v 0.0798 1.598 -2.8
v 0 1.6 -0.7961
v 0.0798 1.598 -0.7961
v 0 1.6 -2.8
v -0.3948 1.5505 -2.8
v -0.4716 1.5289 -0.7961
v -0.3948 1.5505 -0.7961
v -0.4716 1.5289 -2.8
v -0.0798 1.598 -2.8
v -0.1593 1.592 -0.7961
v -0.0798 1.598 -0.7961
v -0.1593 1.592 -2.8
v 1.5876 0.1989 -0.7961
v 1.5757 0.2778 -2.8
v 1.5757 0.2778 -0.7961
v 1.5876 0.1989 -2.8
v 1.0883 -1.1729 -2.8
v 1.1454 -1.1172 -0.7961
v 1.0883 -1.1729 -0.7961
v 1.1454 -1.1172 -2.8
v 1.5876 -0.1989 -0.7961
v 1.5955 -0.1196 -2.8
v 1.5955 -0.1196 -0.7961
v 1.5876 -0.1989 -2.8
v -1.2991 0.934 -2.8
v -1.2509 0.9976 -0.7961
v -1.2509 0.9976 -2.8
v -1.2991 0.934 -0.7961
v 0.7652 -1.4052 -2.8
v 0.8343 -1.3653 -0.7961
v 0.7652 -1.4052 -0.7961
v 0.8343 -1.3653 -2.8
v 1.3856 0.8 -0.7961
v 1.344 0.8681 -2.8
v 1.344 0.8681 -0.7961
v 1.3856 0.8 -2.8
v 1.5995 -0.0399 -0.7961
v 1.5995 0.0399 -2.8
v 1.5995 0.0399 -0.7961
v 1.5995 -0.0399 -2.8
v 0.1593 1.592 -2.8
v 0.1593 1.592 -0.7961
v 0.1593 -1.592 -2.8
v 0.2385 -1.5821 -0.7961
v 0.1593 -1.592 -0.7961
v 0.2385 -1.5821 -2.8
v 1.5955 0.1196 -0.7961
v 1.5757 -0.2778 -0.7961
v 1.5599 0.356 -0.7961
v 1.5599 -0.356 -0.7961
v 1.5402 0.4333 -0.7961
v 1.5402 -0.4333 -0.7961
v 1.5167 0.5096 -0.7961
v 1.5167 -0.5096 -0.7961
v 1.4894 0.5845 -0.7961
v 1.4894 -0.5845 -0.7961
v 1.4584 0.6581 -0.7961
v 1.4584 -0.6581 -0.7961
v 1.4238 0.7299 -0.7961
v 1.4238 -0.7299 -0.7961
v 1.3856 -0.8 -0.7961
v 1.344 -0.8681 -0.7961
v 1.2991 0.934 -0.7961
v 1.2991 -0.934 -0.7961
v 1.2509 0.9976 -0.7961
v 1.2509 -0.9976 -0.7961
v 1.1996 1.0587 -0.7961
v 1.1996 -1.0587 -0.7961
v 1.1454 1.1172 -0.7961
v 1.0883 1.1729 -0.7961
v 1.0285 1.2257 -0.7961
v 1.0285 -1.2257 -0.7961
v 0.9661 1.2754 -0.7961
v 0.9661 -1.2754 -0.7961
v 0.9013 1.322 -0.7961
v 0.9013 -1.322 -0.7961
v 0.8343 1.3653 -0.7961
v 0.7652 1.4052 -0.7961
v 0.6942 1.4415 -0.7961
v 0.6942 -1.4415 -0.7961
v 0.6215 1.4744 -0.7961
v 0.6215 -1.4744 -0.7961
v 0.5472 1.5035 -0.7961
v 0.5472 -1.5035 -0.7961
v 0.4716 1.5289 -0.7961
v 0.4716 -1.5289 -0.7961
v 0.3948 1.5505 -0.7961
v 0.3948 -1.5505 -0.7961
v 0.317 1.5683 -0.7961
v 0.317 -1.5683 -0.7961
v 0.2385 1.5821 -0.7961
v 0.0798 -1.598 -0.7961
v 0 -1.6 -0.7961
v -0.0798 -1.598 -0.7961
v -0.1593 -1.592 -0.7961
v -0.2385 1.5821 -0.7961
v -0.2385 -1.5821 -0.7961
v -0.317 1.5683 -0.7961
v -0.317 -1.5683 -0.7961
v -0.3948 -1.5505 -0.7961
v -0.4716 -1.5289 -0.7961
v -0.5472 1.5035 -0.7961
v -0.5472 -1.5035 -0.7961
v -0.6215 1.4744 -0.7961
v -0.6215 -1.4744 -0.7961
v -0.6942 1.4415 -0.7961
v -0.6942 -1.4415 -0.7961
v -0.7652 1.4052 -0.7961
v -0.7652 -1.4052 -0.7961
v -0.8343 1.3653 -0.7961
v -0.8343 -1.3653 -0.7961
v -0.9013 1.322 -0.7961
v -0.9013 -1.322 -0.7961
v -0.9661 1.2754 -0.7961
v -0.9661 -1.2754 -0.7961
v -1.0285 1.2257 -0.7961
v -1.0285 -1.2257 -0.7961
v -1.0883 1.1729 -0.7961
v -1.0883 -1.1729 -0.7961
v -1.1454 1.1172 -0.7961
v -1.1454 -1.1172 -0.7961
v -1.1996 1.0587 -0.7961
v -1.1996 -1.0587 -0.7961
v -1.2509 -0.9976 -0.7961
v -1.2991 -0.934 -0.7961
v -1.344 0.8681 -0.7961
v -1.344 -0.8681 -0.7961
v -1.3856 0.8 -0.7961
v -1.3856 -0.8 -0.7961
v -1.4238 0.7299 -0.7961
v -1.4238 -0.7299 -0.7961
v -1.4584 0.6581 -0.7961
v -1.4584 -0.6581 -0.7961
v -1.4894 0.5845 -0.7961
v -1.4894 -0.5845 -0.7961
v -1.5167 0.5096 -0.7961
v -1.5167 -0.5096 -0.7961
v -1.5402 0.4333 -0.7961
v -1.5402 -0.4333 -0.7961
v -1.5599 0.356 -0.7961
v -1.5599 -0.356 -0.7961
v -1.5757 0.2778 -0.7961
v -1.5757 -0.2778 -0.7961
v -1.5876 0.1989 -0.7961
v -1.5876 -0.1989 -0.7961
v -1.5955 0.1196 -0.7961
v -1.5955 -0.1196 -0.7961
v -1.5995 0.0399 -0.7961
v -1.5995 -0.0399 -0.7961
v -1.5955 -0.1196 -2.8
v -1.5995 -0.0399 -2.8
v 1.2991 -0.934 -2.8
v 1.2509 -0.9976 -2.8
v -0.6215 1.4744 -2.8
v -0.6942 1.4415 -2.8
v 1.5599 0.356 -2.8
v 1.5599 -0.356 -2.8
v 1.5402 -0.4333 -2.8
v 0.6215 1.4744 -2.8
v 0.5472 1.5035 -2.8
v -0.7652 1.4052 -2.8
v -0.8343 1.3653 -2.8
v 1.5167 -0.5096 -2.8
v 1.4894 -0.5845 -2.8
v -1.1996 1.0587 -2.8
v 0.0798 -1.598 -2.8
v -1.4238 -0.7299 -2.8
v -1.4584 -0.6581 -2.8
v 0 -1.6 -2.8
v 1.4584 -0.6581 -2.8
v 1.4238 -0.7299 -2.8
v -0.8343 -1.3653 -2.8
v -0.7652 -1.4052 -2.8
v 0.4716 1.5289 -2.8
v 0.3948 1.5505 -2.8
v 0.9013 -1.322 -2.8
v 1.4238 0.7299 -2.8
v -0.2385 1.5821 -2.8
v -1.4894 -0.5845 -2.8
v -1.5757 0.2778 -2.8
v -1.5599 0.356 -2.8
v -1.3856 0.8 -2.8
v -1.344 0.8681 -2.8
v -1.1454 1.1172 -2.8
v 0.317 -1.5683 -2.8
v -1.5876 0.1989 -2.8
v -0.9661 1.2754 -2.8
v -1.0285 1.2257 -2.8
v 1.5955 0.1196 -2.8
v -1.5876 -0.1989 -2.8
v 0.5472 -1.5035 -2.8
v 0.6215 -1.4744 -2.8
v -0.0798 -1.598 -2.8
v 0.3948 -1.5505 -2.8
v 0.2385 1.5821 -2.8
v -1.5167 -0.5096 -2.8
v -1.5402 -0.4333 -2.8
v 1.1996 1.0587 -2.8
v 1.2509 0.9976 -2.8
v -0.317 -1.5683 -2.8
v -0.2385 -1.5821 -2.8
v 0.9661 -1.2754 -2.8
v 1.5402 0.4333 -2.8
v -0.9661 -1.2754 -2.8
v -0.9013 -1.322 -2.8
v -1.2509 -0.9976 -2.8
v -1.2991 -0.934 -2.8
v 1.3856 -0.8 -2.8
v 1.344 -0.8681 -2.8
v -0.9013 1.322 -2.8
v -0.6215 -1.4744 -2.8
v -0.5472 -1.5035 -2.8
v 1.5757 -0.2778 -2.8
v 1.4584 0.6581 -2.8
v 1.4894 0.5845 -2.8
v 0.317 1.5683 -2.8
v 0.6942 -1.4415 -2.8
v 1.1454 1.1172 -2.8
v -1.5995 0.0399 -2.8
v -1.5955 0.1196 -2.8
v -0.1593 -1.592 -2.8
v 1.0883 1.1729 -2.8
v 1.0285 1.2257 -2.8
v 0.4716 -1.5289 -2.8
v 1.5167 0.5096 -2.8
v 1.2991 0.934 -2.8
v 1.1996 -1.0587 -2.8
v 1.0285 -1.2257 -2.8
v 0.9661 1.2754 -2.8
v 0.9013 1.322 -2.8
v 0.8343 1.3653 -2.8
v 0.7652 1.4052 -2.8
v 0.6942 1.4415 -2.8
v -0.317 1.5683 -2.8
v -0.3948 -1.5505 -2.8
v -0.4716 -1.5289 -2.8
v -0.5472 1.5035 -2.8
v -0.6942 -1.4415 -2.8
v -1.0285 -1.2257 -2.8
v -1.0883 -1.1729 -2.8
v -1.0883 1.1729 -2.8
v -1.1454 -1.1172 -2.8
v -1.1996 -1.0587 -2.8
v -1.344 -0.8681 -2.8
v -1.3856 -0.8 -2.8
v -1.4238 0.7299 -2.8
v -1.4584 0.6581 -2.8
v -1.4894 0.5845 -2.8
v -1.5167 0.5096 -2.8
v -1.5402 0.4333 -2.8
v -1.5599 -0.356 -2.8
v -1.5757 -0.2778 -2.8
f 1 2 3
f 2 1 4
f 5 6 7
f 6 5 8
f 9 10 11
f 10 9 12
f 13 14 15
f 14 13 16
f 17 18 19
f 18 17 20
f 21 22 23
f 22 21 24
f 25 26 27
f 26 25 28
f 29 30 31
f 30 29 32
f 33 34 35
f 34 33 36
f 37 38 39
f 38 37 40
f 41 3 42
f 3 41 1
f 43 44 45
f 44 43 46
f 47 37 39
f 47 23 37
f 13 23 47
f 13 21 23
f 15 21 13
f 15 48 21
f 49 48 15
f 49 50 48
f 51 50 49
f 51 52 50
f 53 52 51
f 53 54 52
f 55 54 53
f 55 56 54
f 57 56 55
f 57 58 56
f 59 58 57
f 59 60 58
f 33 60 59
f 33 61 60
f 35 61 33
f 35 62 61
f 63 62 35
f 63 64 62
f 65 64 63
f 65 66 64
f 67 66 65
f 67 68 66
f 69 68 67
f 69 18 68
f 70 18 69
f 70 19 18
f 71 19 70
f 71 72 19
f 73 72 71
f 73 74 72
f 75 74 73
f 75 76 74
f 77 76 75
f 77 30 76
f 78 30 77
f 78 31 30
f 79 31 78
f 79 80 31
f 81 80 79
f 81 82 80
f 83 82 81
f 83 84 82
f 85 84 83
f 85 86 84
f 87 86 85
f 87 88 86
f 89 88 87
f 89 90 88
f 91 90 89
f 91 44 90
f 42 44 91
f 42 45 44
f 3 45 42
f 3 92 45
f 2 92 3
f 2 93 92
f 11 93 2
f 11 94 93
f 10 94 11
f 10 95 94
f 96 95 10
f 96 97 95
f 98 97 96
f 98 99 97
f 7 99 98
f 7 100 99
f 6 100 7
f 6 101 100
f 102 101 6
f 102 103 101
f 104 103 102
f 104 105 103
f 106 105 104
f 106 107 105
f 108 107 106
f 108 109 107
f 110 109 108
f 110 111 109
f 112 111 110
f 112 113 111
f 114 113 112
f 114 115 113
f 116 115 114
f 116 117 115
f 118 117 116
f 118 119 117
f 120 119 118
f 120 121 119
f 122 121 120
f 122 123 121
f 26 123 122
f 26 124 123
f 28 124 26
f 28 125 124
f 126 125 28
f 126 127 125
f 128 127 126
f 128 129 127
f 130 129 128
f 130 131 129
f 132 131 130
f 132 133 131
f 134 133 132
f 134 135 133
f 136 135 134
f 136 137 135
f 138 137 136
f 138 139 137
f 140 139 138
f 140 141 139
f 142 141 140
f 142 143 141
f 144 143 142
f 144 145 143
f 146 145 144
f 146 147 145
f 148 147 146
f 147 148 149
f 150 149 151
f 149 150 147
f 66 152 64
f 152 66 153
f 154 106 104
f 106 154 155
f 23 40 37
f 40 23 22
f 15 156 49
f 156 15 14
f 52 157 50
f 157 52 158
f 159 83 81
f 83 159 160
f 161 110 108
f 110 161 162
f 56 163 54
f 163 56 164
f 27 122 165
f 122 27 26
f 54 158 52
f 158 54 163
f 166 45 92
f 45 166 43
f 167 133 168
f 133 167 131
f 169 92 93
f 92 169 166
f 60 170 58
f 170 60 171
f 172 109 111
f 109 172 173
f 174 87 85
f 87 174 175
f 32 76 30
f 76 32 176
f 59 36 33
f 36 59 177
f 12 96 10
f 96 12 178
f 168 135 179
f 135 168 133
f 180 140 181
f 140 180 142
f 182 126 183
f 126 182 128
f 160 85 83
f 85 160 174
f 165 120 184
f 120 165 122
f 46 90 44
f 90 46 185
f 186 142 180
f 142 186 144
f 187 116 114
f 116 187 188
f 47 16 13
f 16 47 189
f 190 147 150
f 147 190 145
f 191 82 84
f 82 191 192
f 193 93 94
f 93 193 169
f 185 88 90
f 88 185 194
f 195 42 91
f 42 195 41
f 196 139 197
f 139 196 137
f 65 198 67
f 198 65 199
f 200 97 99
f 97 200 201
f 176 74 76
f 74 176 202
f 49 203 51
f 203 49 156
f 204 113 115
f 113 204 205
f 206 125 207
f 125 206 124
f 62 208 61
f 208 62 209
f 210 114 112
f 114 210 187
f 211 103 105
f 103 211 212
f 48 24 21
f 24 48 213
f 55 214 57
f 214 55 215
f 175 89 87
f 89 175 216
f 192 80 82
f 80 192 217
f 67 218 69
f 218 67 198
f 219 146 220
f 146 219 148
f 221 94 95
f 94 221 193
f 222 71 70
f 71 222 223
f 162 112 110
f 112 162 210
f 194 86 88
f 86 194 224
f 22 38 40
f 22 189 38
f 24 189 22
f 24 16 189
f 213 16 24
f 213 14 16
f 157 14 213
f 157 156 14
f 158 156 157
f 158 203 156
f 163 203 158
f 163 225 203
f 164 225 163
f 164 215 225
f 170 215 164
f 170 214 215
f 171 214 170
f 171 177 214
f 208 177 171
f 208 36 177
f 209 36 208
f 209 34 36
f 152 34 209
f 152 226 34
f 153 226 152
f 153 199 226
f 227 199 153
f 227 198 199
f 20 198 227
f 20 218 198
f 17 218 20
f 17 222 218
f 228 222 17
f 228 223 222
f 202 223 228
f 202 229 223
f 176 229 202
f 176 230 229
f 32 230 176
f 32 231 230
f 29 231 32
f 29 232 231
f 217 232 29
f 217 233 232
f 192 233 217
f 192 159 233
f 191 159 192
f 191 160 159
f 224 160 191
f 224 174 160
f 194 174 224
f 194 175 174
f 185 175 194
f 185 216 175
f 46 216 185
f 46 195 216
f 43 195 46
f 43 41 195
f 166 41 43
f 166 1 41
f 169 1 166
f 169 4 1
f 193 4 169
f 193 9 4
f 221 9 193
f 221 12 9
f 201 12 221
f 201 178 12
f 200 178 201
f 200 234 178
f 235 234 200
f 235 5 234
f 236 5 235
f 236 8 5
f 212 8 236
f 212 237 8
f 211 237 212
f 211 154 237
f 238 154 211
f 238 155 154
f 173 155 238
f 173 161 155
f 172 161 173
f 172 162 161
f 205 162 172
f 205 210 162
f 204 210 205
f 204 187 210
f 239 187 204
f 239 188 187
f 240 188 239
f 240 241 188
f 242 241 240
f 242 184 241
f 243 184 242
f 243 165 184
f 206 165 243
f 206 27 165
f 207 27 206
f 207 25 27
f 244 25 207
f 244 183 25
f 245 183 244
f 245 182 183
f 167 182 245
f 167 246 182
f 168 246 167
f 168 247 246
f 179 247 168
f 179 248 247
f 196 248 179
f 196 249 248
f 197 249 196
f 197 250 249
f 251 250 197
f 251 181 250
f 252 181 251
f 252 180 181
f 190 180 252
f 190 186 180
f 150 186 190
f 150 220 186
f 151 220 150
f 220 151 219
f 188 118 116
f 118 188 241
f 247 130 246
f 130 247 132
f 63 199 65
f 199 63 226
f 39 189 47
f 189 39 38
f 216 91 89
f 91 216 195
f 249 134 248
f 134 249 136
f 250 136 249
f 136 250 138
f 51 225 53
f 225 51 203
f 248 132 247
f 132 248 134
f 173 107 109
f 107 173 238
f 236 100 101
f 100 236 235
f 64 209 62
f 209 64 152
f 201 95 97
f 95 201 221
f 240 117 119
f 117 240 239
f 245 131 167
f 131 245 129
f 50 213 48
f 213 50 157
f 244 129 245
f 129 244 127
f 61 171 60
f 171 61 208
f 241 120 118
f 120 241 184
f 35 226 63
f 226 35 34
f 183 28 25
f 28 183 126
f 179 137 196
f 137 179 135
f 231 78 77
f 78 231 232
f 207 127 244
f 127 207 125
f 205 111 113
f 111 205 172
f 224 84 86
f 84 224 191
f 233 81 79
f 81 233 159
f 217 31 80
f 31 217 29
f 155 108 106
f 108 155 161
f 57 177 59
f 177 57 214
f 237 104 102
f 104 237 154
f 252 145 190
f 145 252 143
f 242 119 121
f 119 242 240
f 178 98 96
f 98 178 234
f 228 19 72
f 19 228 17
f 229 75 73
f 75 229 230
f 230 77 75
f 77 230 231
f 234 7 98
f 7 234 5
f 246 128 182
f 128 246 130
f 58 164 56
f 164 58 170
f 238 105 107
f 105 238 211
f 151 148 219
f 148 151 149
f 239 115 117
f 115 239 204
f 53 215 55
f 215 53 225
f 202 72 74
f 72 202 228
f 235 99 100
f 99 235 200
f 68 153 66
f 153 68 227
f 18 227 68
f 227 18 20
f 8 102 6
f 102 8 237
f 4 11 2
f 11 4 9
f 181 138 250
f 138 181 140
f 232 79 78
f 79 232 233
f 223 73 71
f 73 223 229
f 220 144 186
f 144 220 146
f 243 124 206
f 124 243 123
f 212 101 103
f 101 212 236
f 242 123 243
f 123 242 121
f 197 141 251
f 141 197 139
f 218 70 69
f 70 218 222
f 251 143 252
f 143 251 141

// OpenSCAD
use <../lib.scad>
use <s/3351as01.scad>
$fa=1; $fs=0.2;
function ldraw_lib__3351ap03(realsolid=false) = [
// 0 Roadsign Triangular Type 1 with Road Works, 1 Dirt Pile Pattern
// 0 Name: 3351ap03.dat
// 0 Author: Jaco van der Molen [Jaco]
// 0 !LDRAW_ORG Part UPDATE 2010-02
// 0 !LICENSE Licensed under CC BY 2.0 and CC BY 4.0 : see CAreadme.txt
// 
// 0 BFC CERTIFY CCW
  [0,"BFC","CERTIFY"],
  [0,"BFC","CCW"],
// 
// 0 !HISTORY 2006-08-08 [WilliamH] Corrected outer red border and white background
// 0 !HISTORY 2010-04-25 [cwdee] Change white to main colour; BFCd
// 0 !HISTORY 2010-07-05 [PTadmin] Official Update 2010-02
// 
// 
// 4 4 -22 -68 -2 22 -68 -2 22 -70 -2 -22 -70 -2
  [4,4,-22,-68,-2,22,-68,-2,22,-70,-2,-22,-70,-2],
// 4 4 22 -70 -2 16.8 -73 -2 -16.8 -73 -2 -22 -70 -2
  [4,4,22,-70,-2,16.8,-73,-2,-16.8,-73,-2,-22,-70,-2],
// 3 4 22 -70 -2 22 -68 -2 23 -68.27 -2
  [3,4,22,-70,-2,22,-68,-2,23,-68.27,-2],
// 3 4 22 -70 -2 23 -68.27 -2 23.73 -69 -2
  [3,4,22,-70,-2,23,-68.27,-2,23.73,-69,-2],
// 3 4 22 -70 -2 23.73 -69 -2 24 -70 -2
  [3,4,22,-70,-2,23.73,-69,-2,24,-70,-2],
// 3 4 22 -70 -2 24 -70 -2 23.73 -71 -2
  [3,4,22,-70,-2,24,-70,-2,23.73,-71,-2],
// 4 4 22 -70 -2 23.73 -71 -2 1.73 -109.1 -2 0 -108.1 -2
  [4,4,22,-70,-2,23.73,-71,-2,1.73,-109.1,-2,0,-108.1,-2],
// 4 4 0 -102.1 -2 16.8 -73 -2 22 -70 -2 0 -108.1 -2
  [4,4,0,-102.1,-2,16.8,-73,-2,22,-70,-2,0,-108.1,-2],
// 3 4 -23 -68.27 -2 -22 -68 -2 -22 -70 -2
  [3,4,-23,-68.27,-2,-22,-68,-2,-22,-70,-2],
// 3 4 -23.73 -69 -2 -23 -68.27 -2 -22 -70 -2
  [3,4,-23.73,-69,-2,-23,-68.27,-2,-22,-70,-2],
// 3 4 -24 -70 -2 -23.73 -69 -2 -22 -70 -2
  [3,4,-24,-70,-2,-23.73,-69,-2,-22,-70,-2],
// 3 4 -23.73 -71 -2 -24 -70 -2 -22 -70 -2
  [3,4,-23.73,-71,-2,-24,-70,-2,-22,-70,-2],
// 4 4 -1.73 -109.1 -2 -23.73 -71 -2 -22 -70 -2 0 -108.1 -2
  [4,4,-1.73,-109.1,-2,-23.73,-71,-2,-22,-70,-2,0,-108.1,-2],
// 4 4 -22 -70 -2 -16.8 -73 -2 0 -102.1 -2 0 -108.1 -2
  [4,4,-22,-70,-2,-16.8,-73,-2,0,-102.1,-2,0,-108.1,-2],
// 3 4 -1 -109.83 -2 -1.73 -109.1 -2 0 -108.1 -2
  [3,4,-1,-109.83,-2,-1.73,-109.1,-2,0,-108.1,-2],
// 3 4 0 -110.1 -2 -1 -109.83 -2 0 -108.1 -2
  [3,4,0,-110.1,-2,-1,-109.83,-2,0,-108.1,-2],
// 3 4 0 -108.1 -2 1 -109.83 -2 0 -110.1 -2
  [3,4,0,-108.1,-2,1,-109.83,-2,0,-110.1,-2],
// 3 4 0 -108.1 -2 1.73 -109.1 -2 1 -109.83 -2
  [3,4,0,-108.1,-2,1.73,-109.1,-2,1,-109.83,-2],
// 0 // Triangle 3 1 -16.8 -73 -2 16.8 -73 -2 0 -102.1 -2
// 1 16 0 0 0 1 0 0 0 1 0 0 0 1 s\3351as01.dat
  [1,16,0,0,0,1,0,0,0,1,0,0,0,1, ldraw_lib__s__3351as01(realsolid)],
// 0 // Man
// 3 0 -1.0625 -89.6875 -2 -1 -88.125 -2 -0.2031 -90.6875 -2
  [3,0,-1.0625,-89.6875,-2,-1,-88.125,-2,-0.2031,-90.6875,-2],
// 3 0 1.2813 -90.6875 -2 -1 -88.125 -2 2.0313 -89.6875 -2
  [3,0,1.2813,-90.6875,-2,-1,-88.125,-2,2.0313,-89.6875,-2],
// 3 0 2.0313 -89.6875 -2 -1 -88.125 -2 2.0313 -88.3438 -2
  [3,0,2.0313,-89.6875,-2,-1,-88.125,-2,2.0313,-88.3438,-2],
// 3 0 2.0313 -88.3438 -2 -1 -88.125 -2 1.0156 -87.4063 -2
  [3,0,2.0313,-88.3438,-2,-1,-88.125,-2,1.0156,-87.4063,-2],
// 3 0 1.0156 -87.4063 -2 -1 -88.125 -2 0 -87.4375 -2
  [3,0,1.0156,-87.4063,-2,-1,-88.125,-2,0,-87.4375,-2],
// 3 0 0 -87.4375 -2 -1 -88.125 -2 -3.5625 -86.2813 -2
  [3,0,0,-87.4375,-2,-1,-88.125,-2,-3.5625,-86.2813,-2],
// 3 0 -3.5625 -86.2813 -2 0.2188 -86.375 -2 0 -87.4375 -2
  [3,0,-3.5625,-86.2813,-2,0.2188,-86.375,-2,0,-87.4375,-2],
// 3 0 -1.1562 -83.9063 -2 0.2188 -86.375 -2 -3.5625 -86.2813 -2
  [3,0,-1.1562,-83.9063,-2,0.2188,-86.375,-2,-3.5625,-86.2813,-2],
// 3 0 -3.5625 -86.2813 -2 -1 -88.125 -2 -4.5 -87.9688 -2
  [3,0,-3.5625,-86.2813,-2,-1,-88.125,-2,-4.5,-87.9688,-2],
// 3 0 -4.5 -87.9688 -2 -4.7187 -86.3438 -2 -3.5625 -86.2813 -2
  [3,0,-4.5,-87.9688,-2,-4.7187,-86.3438,-2,-3.5625,-86.2813,-2],
// 3 0 -9.125 -73.6563 -2 -7.71 -73.6563 -2 -8.1276 -76.5921 -2
  [3,0,-9.125,-73.6563,-2,-7.71,-73.6563,-2,-8.1276,-76.5921,-2],
// 3 0 -8.1276 -76.5921 -2 -7.71 -73.6563 -2 -5.125 -78.625 -2
  [3,0,-8.1276,-76.5921,-2,-7.71,-73.6563,-2,-5.125,-78.625,-2],
// 3 0 -5.125 -78.625 -2 -5.9375 -82.0938 -2 -8.1276 -76.5921 -2
  [3,0,-5.125,-78.625,-2,-5.9375,-82.0938,-2,-8.1276,-76.5921,-2],
// 3 0 -3.9062 -80.4375 -2 -5.9375 -82.0938 -2 -5.125 -78.625 -2
  [3,0,-3.9062,-80.4375,-2,-5.9375,-82.0938,-2,-5.125,-78.625,-2],
// 3 0 -2.3437 -82.5 -2 -5.9375 -82.0938 -2 -3.9062 -80.4375 -2
  [3,0,-2.3437,-82.5,-2,-5.9375,-82.0938,-2,-3.9062,-80.4375,-2],
// 3 0 -3.9062 -80.4375 -2 -1.0625 -81.2813 -2 -2.3437 -82.5 -2
  [3,0,-3.9062,-80.4375,-2,-1.0625,-81.2813,-2,-2.3437,-82.5,-2],
// 3 0 -2.4062 -78.4688 -2 -1.0625 -81.2813 -2 -3.9062 -80.4375 -2
  [3,0,-2.4062,-78.4688,-2,-1.0625,-81.2813,-2,-3.9062,-80.4375,-2],
// 3 0 -0.75 -79.5938 -2 -1.0625 -81.2813 -2 -2.4062 -78.4688 -2
  [3,0,-0.75,-79.5938,-2,-1.0625,-81.2813,-2,-2.4062,-78.4688,-2],
// 3 0 -2.4062 -78.4688 -2 -0.875 -73.6563 -2 -0.75 -79.5938 -2
  [3,0,-2.4062,-78.4688,-2,-0.875,-73.6563,-2,-0.75,-79.5938,-2],
// 3 0 -2.0937 -73.6563 -2 -0.875 -73.6563 -2 -2.4062 -78.4688 -2
  [3,0,-2.0937,-73.6563,-2,-0.875,-73.6563,-2,-2.4062,-78.4688,-2],
// 3 0 -5.5625 -83.875 -2 -5.9375 -82.0938 -2 -2.3437 -82.5 -2
  [3,0,-5.5625,-83.875,-2,-5.9375,-82.0938,-2,-2.3437,-82.5,-2],
// 3 0 -2.3437 -82.5 -2 -4.6875 -84.2188 -2 -5.5625 -83.875 -2
  [3,0,-2.3437,-82.5,-2,-4.6875,-84.2188,-2,-5.5625,-83.875,-2],
// 3 0 -1.1562 -83.9063 -2 -4.6875 -84.2188 -2 -2.3437 -82.5 -2
  [3,0,-1.1562,-83.9063,-2,-4.6875,-84.2188,-2,-2.3437,-82.5,-2],
// 3 0 -3.5625 -86.2813 -2 -4.6875 -84.2188 -2 -1.1562 -83.9063 -2
  [3,0,-3.5625,-86.2813,-2,-4.6875,-84.2188,-2,-1.1562,-83.9063,-2],
// 3 0 -5.8125 -86.7188 -2 -4.7187 -86.3438 -2 -4.5 -87.9688 -2
  [3,0,-5.8125,-86.7188,-2,-4.7187,-86.3438,-2,-4.5,-87.9688,-2],
// 3 0 -6.9062 -85.0625 -2 -4.7187 -86.3438 -2 -5.8125 -86.7188 -2
  [3,0,-6.9062,-85.0625,-2,-4.7187,-86.3438,-2,-5.8125,-86.7188,-2],
// 3 0 -5.875 -84.5938 -2 -4.7187 -86.3438 -2 -6.9062 -85.0625 -2
  [3,0,-5.875,-84.5938,-2,-4.7187,-86.3438,-2,-6.9062,-85.0625,-2],
// 3 0 -6.9062 -85.0625 -2 -7.3437 -84.3438 -2 -5.875 -84.5938 -2
  [3,0,-6.9062,-85.0625,-2,-7.3437,-84.3438,-2,-5.875,-84.5938,-2],
// 3 0 -5.875 -84.5938 -2 -7.3437 -84.3438 -2 -6.1562 -83.7813 -2
  [3,0,-5.875,-84.5938,-2,-7.3437,-84.3438,-2,-6.1562,-83.7813,-2],
// 3 0 -6.1562 -83.7813 -2 -5.5625 -83.875 -2 -5.875 -84.5938 -2
  [3,0,-6.1562,-83.7813,-2,-5.5625,-83.875,-2,-5.875,-84.5938,-2],
// 3 0 0.3281 -83.7813 -2 0.2188 -86.375 -2 -1.1562 -83.9063 -2
  [3,0,0.3281,-83.7813,-2,0.2188,-86.375,-2,-1.1562,-83.9063,-2],
// 3 0 -1.1562 -83.9063 -2 -1.0625 -81.2813 -2 0.3281 -83.7813 -2
  [3,0,-1.1562,-83.9063,-2,-1.0625,-81.2813,-2,0.3281,-83.7813,-2],
// 3 0 0.3281 -83.7813 -2 -1.0625 -81.2813 -2 0.3438 -80.9375 -2
  [3,0,0.3281,-83.7813,-2,-1.0625,-81.2813,-2,0.3438,-80.9375,-2],
// 3 0 0.3438 -80.9375 -2 -1.0625 -81.2813 -2 0.0156 -80.4688 -2
  [3,0,0.3438,-80.9375,-2,-1.0625,-81.2813,-2,0.0156,-80.4688,-2],
// 3 0 1.25 -77.5938 -2 -0.875 -73.6563 -2 12.9531 -73.6563 -2
  [3,0,1.25,-77.5938,-2,-0.875,-73.6563,-2,12.9531,-73.6563,-2],
// 3 0 1.25 -77.5938 -2 12.9531 -73.6563 -2 3.1719 -78.7813 -2
  [3,0,1.25,-77.5938,-2,12.9531,-73.6563,-2,3.1719,-78.7813,-2],
// 3 0 3.1719 -78.7813 -2 12.9531 -73.6563 -2 6.375 -81.625 -2
  [3,0,3.1719,-78.7813,-2,12.9531,-73.6563,-2,6.375,-81.625,-2],
// 3 0 0.0156 -80.4688 -2 3.1719 -78.7813 -2 0.3438 -80.9375 -2
  [3,0,0.0156,-80.4688,-2,3.1719,-78.7813,-2,0.3438,-80.9375,-2],
// 3 0 0.3438 -80.9375 -2 3.1719 -78.7813 -2 3.1719 -79.3594 -2
  [3,0,0.3438,-80.9375,-2,3.1719,-78.7813,-2,3.1719,-79.3594,-2],
// 3 0 3.1719 -79.3594 -2 3.1719 -78.7813 -2 4.625 -81.625 -2
  [3,0,3.1719,-79.3594,-2,3.1719,-78.7813,-2,4.625,-81.625,-2],
// 3 0 4.625 -81.625 -2 3.1719 -78.7813 -2 6.375 -81.625 -2
  [3,0,4.625,-81.625,-2,3.1719,-78.7813,-2,6.375,-81.625,-2],
// 3 0 -0.2031 -90.6875 -2 -1 -88.125 -2 1.2813 -90.6875 -2
  [3,0,-0.2031,-90.6875,-2,-1,-88.125,-2,1.2813,-90.6875,-2],
// 3 0 -5.5625 -83.875 -2 -4.6875 -84.2188 -2 -5.875 -84.5938 -2
  [3,0,-5.5625,-83.875,-2,-4.6875,-84.2188,-2,-5.875,-84.5938,-2],
// 0 // Fill
// 3 16 1.2813 -90.6875 -2 0 -102.1 -2 -0.2031 -90.6875 -2
  [3,16,1.2813,-90.6875,-2,0,-102.1,-2,-0.2031,-90.6875,-2],
// 3 16 2.0313 -89.6875 -2 0 -102.1 -2 1.2813 -90.6875 -2
  [3,16,2.0313,-89.6875,-2,0,-102.1,-2,1.2813,-90.6875,-2],
// 3 16 -0.2031 -90.6875 -2 0 -102.1 -2 -1.0625 -89.6875 -2
  [3,16,-0.2031,-90.6875,-2,0,-102.1,-2,-1.0625,-89.6875,-2],
// 3 16 -4.5 -87.9688 -2 -1 -88.125 -2 -1.0625 -89.6875 -2
  [3,16,-4.5,-87.9688,-2,-1,-88.125,-2,-1.0625,-89.6875,-2],
// 3 16 -1.0625 -89.6875 -2 0 -102.1 -2 -4.5 -87.9688 -2
  [3,16,-1.0625,-89.6875,-2,0,-102.1,-2,-4.5,-87.9688,-2],
// 3 16 0 -87.4375 -2 0.2188 -86.375 -2 1.0156 -87.4063 -2
  [3,16,0,-87.4375,-2,0.2188,-86.375,-2,1.0156,-87.4063,-2],
// 3 16 -4.7187 -86.3438 -2 -4.6875 -84.2188 -2 -3.5625 -86.2813 -2
  [3,16,-4.7187,-86.3438,-2,-4.6875,-84.2188,-2,-3.5625,-86.2813,-2],
// 3 16 -5.875 -84.5938 -2 -4.6875 -84.2188 -2 -4.7187 -86.3438 -2
  [3,16,-5.875,-84.5938,-2,-4.6875,-84.2188,-2,-4.7187,-86.3438,-2],
// 3 16 -2.3437 -82.5 -2 -1.0625 -81.2813 -2 -1.1562 -83.9063 -2
  [3,16,-2.3437,-82.5,-2,-1.0625,-81.2813,-2,-1.1562,-83.9063,-2],
// 3 16 0.0156 -80.4688 -2 -1.0625 -81.2813 -2 -0.75 -79.5938 -2
  [3,16,0.0156,-80.4688,-2,-1.0625,-81.2813,-2,-0.75,-79.5938,-2],
// 3 16 -0.75 -79.5938 -2 1.25 -77.5938 -2 0.0156 -80.4688 -2
  [3,16,-0.75,-79.5938,-2,1.25,-77.5938,-2,0.0156,-80.4688,-2],
// 3 16 0.0156 -80.4688 -2 1.25 -77.5938 -2 3.1719 -78.7813 -2
  [3,16,0.0156,-80.4688,-2,1.25,-77.5938,-2,3.1719,-78.7813,-2],
// 3 16 -0.875 -73.6563 -2 1.25 -77.5938 -2 -0.75 -79.5938 -2
  [3,16,-0.875,-73.6563,-2,1.25,-77.5938,-2,-0.75,-79.5938,-2],
// 3 16 -3.9062 -80.4375 -2 -5.125 -78.625 -2 -2.4062 -78.4688 -2
  [3,16,-3.9062,-80.4375,-2,-5.125,-78.625,-2,-2.4062,-78.4688,-2],
// 3 16 -2.4062 -78.4688 -2 -5.125 -78.625 -2 -2.0937 -73.6563 -2
  [3,16,-2.4062,-78.4688,-2,-5.125,-78.625,-2,-2.0937,-73.6563,-2],
// 3 16 -2.0937 -73.6563 -2 -5.125 -78.625 -2 -7.71 -73.6563 -2
  [3,16,-2.0937,-73.6563,-2,-5.125,-78.625,-2,-7.71,-73.6563,-2],
// 3 16 3.1719 -79.3594 -2 4.625 -81.625 -2 0.3438 -80.9375 -2
  [3,16,3.1719,-79.3594,-2,4.625,-81.625,-2,0.3438,-80.9375,-2],
// 3 16 0.3438 -80.9375 -2 4.625 -81.625 -2 0.3281 -83.7813 -2
  [3,16,0.3438,-80.9375,-2,4.625,-81.625,-2,0.3281,-83.7813,-2],
// 3 16 0.3281 -83.7813 -2 4.625 -81.625 -2 0.2188 -86.375 -2
  [3,16,0.3281,-83.7813,-2,4.625,-81.625,-2,0.2188,-86.375,-2],
// 3 16 0.2188 -86.375 -2 4.625 -81.625 -2 1.0156 -87.4063 -2
  [3,16,0.2188,-86.375,-2,4.625,-81.625,-2,1.0156,-87.4063,-2],
// 3 16 1.0156 -87.4063 -2 4.625 -81.625 -2 2.0313 -88.3438 -2
  [3,16,1.0156,-87.4063,-2,4.625,-81.625,-2,2.0313,-88.3438,-2],
// 3 16 2.0313 -88.3438 -2 4.625 -81.625 -2 6.375 -81.625 -2
  [3,16,2.0313,-88.3438,-2,4.625,-81.625,-2,6.375,-81.625,-2],
// 3 16 6.375 -81.625 -2 2.0313 -89.6875 -2 2.0313 -88.3438 -2
  [3,16,6.375,-81.625,-2,2.0313,-89.6875,-2,2.0313,-88.3438,-2],
// 3 16 -5.9375 -82.0938 -2 -5.5625 -83.875 -2 -6.1562 -83.7813 -2
  [3,16,-5.9375,-82.0938,-2,-5.5625,-83.875,-2,-6.1562,-83.7813,-2],
// 3 16 -6.1562 -83.7813 -2 -7.3437 -84.3438 -2 -5.9375 -82.0938 -2
  [3,16,-6.1562,-83.7813,-2,-7.3437,-84.3438,-2,-5.9375,-82.0938,-2],
// 3 16 -5.9375 -82.0938 -2 -7.3437 -84.3438 -2 -8.1276 -76.5921 -2
  [3,16,-5.9375,-82.0938,-2,-7.3437,-84.3438,-2,-8.1276,-76.5921,-2],
// 3 16 -8.1276 -76.5921 -2 -7.3437 -84.3438 -2 -9.125 -73.6563 -2
  [3,16,-8.1276,-76.5921,-2,-7.3437,-84.3438,-2,-9.125,-73.6563,-2],
// 3 16 12.9531 -73.6563 -2 2.0313 -89.6875 -2 6.375 -81.625 -2
  [3,16,12.9531,-73.6563,-2,2.0313,-89.6875,-2,6.375,-81.625,-2],
// 3 16 -4.5 -87.9688 -2 0 -102.1 -2 -5.8125 -86.7188 -2
  [3,16,-4.5,-87.9688,-2,0,-102.1,-2,-5.8125,-86.7188,-2],
// 3 16 -5.8125 -86.7188 -2 0 -102.1 -2 -6.9062 -85.0625 -2
  [3,16,-5.8125,-86.7188,-2,0,-102.1,-2,-6.9062,-85.0625,-2],
// 3 16 0 -102.1 -2 -7.3437 -84.3438 -2 -6.9062 -85.0625 -2
  [3,16,0,-102.1,-2,-7.3437,-84.3438,-2,-6.9062,-85.0625,-2],
// 3 16 -9.125 -73.6563 -2 -7.3437 -84.3438 -2 -16.8 -73 -2
  [3,16,-9.125,-73.6563,-2,-7.3437,-84.3438,-2,-16.8,-73,-2],
// 3 16 -16.8 -73 -2 -7.3437 -84.3438 -2 0 -102.1 -2
  [3,16,-16.8,-73,-2,-7.3437,-84.3438,-2,0,-102.1,-2],
// 3 16 -7.71 -73.6563 -2 -5.0625 -73 -2 -2.0937 -73.6563 -2
  [3,16,-7.71,-73.6563,-2,-5.0625,-73,-2,-2.0937,-73.6563,-2],
// 3 16 -2.0937 -73.6563 -2 -5.0625 -73 -2 0.0342 -73 -2
  [3,16,-2.0937,-73.6563,-2,-5.0625,-73,-2,0.0342,-73,-2],
// 3 16 0.0342 -73 -2 12.9531 -73.6563 -2 -2.0937 -73.6563 -2
  [3,16,0.0342,-73,-2,12.9531,-73.6563,-2,-2.0937,-73.6563,-2],
// 3 16 16.8 -73 -2 12.9531 -73.6563 -2 0.0342 -73 -2
  [3,16,16.8,-73,-2,12.9531,-73.6563,-2,0.0342,-73,-2],
// 3 16 0 -102.1 -2 2.0313 -89.6875 -2 12.9531 -73.6563 -2
  [3,16,0,-102.1,-2,2.0313,-89.6875,-2,12.9531,-73.6563,-2],
// 3 16 -9.125 -73.6563 -2 -5.0625 -73 -2 -7.71 -73.6563 -2
  [3,16,-9.125,-73.6563,-2,-5.0625,-73,-2,-7.71,-73.6563,-2],
// 3 16 -16.8 -73 -2 -5.0625 -73 -2 -9.125 -73.6563 -2
  [3,16,-16.8,-73,-2,-5.0625,-73,-2,-9.125,-73.6563,-2],
// 3 16 12.9531 -73.6563 -2 16.8 -73 -2 0 -102.1 -2
  [3,16,12.9531,-73.6563,-2,16.8,-73,-2,0,-102.1,-2],
// 0
];
module ldraw_lib__3351ap03(step=0, col=false, unit=2/5, alt=false, line=0.2, solid=!$preview)
    makepoly(ldraw_lib__3351ap03(solid), step=step, col=col, unit=unit, alt=alt, line=line, solid=solid);
ldraw_lib__3351ap03(line=0.2);
